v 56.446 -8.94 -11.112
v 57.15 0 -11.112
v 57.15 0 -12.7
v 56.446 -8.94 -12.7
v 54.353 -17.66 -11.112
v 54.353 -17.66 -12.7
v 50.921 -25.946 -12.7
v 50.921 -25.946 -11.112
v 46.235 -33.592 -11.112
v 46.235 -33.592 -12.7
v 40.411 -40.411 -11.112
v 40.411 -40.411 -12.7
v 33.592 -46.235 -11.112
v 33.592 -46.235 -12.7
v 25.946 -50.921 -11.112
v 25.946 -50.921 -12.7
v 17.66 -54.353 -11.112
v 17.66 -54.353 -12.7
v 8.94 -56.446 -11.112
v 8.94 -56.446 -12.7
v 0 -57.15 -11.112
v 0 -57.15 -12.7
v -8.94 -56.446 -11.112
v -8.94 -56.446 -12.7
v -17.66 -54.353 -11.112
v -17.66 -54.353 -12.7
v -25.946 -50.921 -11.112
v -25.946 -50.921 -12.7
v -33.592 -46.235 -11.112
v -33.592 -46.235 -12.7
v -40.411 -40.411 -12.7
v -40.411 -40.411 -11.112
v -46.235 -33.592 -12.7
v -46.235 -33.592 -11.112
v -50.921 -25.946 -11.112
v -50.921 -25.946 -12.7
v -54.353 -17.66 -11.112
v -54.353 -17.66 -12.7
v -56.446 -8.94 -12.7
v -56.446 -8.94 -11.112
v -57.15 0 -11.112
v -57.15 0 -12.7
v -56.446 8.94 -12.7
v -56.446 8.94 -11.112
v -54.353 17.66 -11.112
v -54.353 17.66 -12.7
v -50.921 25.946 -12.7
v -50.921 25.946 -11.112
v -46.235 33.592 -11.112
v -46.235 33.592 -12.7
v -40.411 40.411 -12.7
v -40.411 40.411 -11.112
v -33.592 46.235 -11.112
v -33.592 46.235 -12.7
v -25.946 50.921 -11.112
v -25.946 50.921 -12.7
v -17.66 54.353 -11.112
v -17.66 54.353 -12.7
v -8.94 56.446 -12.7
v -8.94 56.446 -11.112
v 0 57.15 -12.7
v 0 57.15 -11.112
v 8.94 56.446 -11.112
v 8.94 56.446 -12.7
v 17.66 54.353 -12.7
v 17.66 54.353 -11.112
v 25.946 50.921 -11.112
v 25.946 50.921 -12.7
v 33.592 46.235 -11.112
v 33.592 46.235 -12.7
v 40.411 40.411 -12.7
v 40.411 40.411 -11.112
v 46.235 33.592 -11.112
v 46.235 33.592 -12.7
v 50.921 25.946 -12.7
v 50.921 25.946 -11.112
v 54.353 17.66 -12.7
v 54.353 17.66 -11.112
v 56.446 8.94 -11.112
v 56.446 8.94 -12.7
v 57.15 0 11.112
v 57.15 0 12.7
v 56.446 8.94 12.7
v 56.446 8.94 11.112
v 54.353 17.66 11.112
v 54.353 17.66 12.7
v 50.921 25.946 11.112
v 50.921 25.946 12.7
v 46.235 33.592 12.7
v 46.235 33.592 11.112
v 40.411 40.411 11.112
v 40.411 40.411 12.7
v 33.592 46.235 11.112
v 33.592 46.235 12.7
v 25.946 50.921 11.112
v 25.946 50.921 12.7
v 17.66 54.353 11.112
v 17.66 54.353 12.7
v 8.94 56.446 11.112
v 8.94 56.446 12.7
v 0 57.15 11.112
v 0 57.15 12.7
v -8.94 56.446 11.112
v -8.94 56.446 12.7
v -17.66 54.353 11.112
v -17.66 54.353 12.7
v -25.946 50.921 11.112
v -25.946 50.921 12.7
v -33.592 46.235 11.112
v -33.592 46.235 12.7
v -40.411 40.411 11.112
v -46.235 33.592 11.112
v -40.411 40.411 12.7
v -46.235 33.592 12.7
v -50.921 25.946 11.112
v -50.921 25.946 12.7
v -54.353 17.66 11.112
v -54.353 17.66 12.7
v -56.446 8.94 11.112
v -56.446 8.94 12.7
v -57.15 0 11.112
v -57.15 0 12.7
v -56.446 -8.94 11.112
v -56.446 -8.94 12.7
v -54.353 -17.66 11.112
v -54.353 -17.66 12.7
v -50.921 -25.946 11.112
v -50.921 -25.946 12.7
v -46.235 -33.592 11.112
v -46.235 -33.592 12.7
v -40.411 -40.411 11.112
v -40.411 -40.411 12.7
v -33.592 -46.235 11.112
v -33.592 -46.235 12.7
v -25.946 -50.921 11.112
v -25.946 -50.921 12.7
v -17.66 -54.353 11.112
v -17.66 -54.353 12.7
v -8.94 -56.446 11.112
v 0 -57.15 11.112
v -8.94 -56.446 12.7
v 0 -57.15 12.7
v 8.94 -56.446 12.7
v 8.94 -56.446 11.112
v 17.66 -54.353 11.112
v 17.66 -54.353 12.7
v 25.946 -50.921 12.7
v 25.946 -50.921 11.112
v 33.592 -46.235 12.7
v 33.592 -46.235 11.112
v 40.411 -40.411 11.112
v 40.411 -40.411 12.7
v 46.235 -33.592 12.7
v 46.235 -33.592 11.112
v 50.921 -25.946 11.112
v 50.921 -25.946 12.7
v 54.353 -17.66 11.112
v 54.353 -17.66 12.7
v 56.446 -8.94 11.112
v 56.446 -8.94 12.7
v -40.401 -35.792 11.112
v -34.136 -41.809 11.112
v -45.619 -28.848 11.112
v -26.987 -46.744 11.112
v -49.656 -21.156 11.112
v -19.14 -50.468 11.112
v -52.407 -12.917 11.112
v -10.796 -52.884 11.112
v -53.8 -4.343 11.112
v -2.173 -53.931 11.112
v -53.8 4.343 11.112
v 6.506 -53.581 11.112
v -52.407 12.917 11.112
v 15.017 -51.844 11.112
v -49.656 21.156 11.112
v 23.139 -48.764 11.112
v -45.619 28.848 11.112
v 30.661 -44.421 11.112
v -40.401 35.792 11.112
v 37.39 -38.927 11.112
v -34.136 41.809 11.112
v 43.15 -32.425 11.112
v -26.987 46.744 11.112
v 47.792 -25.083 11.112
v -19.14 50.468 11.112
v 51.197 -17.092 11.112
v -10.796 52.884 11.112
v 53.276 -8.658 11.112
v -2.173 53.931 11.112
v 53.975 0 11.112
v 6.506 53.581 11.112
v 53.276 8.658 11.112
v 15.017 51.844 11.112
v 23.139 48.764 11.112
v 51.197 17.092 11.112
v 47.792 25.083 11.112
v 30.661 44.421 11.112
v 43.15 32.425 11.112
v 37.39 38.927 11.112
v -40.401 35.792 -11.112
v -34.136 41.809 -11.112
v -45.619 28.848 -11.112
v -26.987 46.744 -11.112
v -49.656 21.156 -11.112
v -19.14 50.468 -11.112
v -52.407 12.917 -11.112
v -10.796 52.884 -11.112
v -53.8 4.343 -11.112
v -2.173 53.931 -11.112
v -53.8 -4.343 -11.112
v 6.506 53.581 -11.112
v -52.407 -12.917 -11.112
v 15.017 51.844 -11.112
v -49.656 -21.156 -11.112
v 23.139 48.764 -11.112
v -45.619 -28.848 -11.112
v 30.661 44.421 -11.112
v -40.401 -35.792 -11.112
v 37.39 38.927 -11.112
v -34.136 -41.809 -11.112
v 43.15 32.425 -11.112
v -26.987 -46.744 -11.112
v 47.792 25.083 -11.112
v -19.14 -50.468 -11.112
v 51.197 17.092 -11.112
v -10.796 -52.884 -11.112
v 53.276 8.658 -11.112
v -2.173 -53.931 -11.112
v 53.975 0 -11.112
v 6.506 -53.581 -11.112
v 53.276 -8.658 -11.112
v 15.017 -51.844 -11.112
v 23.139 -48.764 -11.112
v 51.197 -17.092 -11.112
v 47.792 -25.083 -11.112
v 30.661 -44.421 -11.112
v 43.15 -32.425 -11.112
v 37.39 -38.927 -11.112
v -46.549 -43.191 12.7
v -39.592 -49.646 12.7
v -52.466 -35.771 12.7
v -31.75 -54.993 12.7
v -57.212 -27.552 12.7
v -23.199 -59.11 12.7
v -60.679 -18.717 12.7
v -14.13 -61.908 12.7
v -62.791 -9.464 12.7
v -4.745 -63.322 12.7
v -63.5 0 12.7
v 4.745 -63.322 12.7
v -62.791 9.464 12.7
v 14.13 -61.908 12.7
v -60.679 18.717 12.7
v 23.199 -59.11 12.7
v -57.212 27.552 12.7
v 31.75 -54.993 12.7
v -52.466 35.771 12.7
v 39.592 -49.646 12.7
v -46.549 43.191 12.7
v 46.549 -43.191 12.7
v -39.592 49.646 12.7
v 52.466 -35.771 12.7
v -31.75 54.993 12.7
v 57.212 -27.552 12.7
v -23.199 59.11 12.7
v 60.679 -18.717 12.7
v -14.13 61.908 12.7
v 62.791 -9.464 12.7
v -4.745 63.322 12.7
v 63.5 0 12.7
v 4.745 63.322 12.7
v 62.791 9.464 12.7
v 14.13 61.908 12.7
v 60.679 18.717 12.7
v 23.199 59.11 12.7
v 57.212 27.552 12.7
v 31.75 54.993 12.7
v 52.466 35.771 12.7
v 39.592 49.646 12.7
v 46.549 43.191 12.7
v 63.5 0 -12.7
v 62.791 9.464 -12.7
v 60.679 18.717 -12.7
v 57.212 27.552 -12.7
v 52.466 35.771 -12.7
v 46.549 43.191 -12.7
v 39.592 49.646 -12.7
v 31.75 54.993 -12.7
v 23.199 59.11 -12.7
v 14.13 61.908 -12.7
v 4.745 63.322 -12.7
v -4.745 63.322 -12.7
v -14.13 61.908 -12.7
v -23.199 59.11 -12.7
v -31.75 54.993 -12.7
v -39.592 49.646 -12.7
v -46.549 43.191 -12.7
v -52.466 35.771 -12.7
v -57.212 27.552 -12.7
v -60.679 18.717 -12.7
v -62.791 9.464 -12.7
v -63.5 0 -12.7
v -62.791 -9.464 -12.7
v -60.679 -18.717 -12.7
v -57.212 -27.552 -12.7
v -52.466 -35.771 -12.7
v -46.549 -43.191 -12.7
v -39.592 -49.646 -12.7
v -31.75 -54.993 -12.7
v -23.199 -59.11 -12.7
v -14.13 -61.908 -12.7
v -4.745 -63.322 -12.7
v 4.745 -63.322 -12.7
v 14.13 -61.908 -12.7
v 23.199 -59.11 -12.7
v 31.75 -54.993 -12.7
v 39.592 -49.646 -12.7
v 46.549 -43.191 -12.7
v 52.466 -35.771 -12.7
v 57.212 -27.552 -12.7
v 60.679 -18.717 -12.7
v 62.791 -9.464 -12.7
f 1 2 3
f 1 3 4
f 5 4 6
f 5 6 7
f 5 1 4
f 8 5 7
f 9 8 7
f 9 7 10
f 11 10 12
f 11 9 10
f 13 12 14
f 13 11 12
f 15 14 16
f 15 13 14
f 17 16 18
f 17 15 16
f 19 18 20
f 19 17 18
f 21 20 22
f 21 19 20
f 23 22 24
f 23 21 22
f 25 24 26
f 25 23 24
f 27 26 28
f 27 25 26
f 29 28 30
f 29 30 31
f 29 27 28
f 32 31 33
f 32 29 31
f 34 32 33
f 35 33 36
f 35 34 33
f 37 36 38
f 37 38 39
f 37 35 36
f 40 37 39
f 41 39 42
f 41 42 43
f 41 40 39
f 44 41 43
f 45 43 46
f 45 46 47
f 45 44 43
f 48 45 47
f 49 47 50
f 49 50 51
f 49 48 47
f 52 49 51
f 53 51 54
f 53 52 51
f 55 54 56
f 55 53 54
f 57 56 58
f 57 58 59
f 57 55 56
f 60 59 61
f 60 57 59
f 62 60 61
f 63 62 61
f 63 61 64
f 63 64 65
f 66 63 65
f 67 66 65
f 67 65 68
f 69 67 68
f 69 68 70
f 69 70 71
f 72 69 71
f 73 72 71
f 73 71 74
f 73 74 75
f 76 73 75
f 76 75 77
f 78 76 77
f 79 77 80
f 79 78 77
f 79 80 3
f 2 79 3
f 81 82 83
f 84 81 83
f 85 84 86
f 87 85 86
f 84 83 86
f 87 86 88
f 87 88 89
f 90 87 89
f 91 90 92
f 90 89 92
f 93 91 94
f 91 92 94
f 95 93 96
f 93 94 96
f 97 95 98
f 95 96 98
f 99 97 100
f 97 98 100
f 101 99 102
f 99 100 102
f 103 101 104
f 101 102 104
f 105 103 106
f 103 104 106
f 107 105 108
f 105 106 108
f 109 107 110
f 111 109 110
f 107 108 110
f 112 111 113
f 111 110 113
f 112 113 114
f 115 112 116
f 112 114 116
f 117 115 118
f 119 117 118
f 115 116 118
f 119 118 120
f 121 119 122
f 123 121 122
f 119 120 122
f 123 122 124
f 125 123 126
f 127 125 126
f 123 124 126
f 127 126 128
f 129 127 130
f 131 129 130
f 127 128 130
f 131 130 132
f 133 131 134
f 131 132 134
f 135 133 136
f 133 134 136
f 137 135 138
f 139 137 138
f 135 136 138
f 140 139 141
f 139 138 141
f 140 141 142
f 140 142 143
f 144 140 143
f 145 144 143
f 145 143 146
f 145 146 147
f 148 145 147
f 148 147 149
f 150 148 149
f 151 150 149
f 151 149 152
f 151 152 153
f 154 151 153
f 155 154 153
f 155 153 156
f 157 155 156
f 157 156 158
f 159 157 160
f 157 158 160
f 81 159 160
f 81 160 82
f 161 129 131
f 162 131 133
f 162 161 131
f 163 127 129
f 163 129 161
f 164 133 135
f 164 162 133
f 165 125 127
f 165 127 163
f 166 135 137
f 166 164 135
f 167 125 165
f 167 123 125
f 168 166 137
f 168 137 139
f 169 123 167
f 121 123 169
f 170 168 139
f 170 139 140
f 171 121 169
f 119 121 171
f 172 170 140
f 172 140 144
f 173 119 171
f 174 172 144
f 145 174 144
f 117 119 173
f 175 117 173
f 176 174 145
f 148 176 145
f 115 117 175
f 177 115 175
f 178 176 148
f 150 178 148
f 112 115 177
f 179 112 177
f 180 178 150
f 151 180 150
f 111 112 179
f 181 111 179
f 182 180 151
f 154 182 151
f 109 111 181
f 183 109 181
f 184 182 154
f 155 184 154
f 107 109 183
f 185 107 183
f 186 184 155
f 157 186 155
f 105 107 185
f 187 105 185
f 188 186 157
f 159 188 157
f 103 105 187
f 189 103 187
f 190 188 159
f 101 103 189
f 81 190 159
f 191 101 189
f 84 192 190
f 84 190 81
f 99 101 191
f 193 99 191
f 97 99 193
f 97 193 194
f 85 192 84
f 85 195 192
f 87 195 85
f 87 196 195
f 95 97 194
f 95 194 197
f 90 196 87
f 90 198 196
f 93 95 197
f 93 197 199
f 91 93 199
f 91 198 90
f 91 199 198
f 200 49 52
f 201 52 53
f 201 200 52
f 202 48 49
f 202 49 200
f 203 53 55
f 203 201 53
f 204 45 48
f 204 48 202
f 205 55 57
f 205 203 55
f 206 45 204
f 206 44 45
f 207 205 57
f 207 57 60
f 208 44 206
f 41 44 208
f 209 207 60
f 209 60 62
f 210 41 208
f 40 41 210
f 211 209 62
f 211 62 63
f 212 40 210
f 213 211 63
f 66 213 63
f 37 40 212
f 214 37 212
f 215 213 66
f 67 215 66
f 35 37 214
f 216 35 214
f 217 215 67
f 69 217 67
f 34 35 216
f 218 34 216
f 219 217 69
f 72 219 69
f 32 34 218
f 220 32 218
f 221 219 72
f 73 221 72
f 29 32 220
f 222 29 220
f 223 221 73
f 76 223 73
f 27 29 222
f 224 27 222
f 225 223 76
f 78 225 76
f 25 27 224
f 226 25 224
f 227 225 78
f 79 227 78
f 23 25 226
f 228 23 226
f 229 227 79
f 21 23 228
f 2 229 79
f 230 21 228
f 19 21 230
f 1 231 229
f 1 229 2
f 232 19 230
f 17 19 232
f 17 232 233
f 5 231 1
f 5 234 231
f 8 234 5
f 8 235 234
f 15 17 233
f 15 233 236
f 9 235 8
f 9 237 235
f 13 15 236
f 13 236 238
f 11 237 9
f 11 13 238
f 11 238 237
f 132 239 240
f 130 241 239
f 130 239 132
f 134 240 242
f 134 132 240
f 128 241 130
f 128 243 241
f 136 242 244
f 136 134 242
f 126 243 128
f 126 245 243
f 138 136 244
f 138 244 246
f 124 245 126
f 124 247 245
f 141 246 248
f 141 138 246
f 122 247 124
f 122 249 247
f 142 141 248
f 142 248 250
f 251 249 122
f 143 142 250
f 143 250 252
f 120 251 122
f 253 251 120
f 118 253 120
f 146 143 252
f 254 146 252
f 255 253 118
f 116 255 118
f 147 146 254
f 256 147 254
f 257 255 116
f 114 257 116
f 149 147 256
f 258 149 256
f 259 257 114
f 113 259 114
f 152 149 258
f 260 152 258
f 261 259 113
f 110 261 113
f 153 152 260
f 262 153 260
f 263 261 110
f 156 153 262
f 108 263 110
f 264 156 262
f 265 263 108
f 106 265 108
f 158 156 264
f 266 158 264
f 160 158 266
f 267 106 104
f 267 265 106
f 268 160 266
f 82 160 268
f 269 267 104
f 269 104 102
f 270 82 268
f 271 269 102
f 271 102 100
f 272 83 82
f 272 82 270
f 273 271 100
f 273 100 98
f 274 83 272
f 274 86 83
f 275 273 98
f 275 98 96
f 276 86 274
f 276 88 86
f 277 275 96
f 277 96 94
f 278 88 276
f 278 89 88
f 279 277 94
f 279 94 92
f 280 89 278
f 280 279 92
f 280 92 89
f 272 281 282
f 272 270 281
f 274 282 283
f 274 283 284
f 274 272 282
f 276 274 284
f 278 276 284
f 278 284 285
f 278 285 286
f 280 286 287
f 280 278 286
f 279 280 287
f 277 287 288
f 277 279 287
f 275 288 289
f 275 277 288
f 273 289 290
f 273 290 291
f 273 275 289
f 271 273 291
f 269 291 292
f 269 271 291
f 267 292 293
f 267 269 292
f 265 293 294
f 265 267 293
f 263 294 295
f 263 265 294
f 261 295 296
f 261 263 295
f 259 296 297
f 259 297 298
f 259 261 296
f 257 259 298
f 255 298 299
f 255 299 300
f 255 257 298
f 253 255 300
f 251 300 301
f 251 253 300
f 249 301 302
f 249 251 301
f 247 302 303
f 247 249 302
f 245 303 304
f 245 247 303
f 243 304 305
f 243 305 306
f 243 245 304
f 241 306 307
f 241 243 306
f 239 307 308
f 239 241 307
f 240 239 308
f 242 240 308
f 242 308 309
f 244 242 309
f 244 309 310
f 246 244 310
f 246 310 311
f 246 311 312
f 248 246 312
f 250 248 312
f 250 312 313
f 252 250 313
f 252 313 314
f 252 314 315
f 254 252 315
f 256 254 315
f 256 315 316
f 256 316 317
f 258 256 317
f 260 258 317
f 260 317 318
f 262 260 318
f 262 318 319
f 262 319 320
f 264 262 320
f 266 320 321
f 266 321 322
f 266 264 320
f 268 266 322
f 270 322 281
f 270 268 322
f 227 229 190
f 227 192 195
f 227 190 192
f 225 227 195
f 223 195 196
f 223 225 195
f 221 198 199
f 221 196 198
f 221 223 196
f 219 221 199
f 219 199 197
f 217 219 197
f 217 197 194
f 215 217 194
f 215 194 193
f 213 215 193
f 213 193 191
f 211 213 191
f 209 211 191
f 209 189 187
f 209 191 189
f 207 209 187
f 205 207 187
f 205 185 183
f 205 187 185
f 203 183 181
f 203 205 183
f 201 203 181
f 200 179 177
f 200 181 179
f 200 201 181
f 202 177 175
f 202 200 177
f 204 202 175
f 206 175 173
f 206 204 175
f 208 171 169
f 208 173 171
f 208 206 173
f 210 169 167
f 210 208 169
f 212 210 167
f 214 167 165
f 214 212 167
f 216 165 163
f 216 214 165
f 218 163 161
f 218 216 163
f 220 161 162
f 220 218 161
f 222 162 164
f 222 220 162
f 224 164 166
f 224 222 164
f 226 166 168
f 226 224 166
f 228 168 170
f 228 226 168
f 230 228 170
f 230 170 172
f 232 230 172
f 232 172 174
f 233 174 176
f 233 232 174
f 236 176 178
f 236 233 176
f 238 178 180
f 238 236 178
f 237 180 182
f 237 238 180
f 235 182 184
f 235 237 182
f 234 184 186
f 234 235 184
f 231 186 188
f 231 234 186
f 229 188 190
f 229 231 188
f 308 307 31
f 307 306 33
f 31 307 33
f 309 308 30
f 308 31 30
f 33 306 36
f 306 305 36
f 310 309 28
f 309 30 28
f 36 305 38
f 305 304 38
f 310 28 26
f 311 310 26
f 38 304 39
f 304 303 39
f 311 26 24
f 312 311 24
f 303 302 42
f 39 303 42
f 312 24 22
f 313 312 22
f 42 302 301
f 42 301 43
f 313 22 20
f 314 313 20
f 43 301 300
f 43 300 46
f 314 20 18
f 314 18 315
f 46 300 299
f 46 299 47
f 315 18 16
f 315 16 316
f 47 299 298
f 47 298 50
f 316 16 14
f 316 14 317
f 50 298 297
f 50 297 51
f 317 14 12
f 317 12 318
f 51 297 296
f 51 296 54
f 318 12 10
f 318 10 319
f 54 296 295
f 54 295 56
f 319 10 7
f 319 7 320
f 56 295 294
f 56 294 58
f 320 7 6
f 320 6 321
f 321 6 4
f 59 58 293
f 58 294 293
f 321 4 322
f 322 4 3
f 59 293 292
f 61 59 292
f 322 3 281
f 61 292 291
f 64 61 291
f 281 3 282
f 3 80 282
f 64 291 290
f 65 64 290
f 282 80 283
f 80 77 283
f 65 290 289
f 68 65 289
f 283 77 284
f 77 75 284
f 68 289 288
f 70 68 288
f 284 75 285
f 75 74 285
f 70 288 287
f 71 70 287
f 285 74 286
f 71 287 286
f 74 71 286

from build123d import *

# Parameters (mm, degrees)
SKETCH1_R           = 63.5
SKETCH1_R_2         = 53.975
BOSS_EXTRUDE1_DEPTH = 12.7
SKETCH2_R           = 57.15
CUT_EXTRUDE1_DEPTH  = 1.5875
CUT_EXTRUDE2_START  = -1.5875
SKETCH3_R           = 57.15
CUT_EXTRUDE2_DEPTH  = 1.5875


with BuildPart() as part:
    # Sketch1 → Boss-Extrude1 (new, symmetric)
    with BuildSketch(Plane.XY):
        Circle(SKETCH1_R)
        Circle(SKETCH1_R_2, mode=Mode.SUBTRACT)
    extrude(amount=BOSS_EXTRUDE1_DEPTH, both=True)

    # Sketch2 → Cut-Extrude1 (cut)
    with BuildSketch(Plane.XY.offset(12.7)):
        Circle(SKETCH2_R)
    extrude(amount=-CUT_EXTRUDE1_DEPTH, mode=Mode.SUBTRACT)

    # Sketch3 → Cut-Extrude2 (cut)
    with BuildSketch(Plane(origin=(0, 0, -12.7), x_dir=(-1, 0, 0), z_dir=(0, 0, -1)).offset(CUT_EXTRUDE2_START)):
        with Locations(Location((0, 0, 0), (0, 0, 180))):
            Circle(SKETCH3_R)
    extrude(amount=CUT_EXTRUDE2_DEPTH, mode=Mode.SUBTRACT)


solid = part.part
